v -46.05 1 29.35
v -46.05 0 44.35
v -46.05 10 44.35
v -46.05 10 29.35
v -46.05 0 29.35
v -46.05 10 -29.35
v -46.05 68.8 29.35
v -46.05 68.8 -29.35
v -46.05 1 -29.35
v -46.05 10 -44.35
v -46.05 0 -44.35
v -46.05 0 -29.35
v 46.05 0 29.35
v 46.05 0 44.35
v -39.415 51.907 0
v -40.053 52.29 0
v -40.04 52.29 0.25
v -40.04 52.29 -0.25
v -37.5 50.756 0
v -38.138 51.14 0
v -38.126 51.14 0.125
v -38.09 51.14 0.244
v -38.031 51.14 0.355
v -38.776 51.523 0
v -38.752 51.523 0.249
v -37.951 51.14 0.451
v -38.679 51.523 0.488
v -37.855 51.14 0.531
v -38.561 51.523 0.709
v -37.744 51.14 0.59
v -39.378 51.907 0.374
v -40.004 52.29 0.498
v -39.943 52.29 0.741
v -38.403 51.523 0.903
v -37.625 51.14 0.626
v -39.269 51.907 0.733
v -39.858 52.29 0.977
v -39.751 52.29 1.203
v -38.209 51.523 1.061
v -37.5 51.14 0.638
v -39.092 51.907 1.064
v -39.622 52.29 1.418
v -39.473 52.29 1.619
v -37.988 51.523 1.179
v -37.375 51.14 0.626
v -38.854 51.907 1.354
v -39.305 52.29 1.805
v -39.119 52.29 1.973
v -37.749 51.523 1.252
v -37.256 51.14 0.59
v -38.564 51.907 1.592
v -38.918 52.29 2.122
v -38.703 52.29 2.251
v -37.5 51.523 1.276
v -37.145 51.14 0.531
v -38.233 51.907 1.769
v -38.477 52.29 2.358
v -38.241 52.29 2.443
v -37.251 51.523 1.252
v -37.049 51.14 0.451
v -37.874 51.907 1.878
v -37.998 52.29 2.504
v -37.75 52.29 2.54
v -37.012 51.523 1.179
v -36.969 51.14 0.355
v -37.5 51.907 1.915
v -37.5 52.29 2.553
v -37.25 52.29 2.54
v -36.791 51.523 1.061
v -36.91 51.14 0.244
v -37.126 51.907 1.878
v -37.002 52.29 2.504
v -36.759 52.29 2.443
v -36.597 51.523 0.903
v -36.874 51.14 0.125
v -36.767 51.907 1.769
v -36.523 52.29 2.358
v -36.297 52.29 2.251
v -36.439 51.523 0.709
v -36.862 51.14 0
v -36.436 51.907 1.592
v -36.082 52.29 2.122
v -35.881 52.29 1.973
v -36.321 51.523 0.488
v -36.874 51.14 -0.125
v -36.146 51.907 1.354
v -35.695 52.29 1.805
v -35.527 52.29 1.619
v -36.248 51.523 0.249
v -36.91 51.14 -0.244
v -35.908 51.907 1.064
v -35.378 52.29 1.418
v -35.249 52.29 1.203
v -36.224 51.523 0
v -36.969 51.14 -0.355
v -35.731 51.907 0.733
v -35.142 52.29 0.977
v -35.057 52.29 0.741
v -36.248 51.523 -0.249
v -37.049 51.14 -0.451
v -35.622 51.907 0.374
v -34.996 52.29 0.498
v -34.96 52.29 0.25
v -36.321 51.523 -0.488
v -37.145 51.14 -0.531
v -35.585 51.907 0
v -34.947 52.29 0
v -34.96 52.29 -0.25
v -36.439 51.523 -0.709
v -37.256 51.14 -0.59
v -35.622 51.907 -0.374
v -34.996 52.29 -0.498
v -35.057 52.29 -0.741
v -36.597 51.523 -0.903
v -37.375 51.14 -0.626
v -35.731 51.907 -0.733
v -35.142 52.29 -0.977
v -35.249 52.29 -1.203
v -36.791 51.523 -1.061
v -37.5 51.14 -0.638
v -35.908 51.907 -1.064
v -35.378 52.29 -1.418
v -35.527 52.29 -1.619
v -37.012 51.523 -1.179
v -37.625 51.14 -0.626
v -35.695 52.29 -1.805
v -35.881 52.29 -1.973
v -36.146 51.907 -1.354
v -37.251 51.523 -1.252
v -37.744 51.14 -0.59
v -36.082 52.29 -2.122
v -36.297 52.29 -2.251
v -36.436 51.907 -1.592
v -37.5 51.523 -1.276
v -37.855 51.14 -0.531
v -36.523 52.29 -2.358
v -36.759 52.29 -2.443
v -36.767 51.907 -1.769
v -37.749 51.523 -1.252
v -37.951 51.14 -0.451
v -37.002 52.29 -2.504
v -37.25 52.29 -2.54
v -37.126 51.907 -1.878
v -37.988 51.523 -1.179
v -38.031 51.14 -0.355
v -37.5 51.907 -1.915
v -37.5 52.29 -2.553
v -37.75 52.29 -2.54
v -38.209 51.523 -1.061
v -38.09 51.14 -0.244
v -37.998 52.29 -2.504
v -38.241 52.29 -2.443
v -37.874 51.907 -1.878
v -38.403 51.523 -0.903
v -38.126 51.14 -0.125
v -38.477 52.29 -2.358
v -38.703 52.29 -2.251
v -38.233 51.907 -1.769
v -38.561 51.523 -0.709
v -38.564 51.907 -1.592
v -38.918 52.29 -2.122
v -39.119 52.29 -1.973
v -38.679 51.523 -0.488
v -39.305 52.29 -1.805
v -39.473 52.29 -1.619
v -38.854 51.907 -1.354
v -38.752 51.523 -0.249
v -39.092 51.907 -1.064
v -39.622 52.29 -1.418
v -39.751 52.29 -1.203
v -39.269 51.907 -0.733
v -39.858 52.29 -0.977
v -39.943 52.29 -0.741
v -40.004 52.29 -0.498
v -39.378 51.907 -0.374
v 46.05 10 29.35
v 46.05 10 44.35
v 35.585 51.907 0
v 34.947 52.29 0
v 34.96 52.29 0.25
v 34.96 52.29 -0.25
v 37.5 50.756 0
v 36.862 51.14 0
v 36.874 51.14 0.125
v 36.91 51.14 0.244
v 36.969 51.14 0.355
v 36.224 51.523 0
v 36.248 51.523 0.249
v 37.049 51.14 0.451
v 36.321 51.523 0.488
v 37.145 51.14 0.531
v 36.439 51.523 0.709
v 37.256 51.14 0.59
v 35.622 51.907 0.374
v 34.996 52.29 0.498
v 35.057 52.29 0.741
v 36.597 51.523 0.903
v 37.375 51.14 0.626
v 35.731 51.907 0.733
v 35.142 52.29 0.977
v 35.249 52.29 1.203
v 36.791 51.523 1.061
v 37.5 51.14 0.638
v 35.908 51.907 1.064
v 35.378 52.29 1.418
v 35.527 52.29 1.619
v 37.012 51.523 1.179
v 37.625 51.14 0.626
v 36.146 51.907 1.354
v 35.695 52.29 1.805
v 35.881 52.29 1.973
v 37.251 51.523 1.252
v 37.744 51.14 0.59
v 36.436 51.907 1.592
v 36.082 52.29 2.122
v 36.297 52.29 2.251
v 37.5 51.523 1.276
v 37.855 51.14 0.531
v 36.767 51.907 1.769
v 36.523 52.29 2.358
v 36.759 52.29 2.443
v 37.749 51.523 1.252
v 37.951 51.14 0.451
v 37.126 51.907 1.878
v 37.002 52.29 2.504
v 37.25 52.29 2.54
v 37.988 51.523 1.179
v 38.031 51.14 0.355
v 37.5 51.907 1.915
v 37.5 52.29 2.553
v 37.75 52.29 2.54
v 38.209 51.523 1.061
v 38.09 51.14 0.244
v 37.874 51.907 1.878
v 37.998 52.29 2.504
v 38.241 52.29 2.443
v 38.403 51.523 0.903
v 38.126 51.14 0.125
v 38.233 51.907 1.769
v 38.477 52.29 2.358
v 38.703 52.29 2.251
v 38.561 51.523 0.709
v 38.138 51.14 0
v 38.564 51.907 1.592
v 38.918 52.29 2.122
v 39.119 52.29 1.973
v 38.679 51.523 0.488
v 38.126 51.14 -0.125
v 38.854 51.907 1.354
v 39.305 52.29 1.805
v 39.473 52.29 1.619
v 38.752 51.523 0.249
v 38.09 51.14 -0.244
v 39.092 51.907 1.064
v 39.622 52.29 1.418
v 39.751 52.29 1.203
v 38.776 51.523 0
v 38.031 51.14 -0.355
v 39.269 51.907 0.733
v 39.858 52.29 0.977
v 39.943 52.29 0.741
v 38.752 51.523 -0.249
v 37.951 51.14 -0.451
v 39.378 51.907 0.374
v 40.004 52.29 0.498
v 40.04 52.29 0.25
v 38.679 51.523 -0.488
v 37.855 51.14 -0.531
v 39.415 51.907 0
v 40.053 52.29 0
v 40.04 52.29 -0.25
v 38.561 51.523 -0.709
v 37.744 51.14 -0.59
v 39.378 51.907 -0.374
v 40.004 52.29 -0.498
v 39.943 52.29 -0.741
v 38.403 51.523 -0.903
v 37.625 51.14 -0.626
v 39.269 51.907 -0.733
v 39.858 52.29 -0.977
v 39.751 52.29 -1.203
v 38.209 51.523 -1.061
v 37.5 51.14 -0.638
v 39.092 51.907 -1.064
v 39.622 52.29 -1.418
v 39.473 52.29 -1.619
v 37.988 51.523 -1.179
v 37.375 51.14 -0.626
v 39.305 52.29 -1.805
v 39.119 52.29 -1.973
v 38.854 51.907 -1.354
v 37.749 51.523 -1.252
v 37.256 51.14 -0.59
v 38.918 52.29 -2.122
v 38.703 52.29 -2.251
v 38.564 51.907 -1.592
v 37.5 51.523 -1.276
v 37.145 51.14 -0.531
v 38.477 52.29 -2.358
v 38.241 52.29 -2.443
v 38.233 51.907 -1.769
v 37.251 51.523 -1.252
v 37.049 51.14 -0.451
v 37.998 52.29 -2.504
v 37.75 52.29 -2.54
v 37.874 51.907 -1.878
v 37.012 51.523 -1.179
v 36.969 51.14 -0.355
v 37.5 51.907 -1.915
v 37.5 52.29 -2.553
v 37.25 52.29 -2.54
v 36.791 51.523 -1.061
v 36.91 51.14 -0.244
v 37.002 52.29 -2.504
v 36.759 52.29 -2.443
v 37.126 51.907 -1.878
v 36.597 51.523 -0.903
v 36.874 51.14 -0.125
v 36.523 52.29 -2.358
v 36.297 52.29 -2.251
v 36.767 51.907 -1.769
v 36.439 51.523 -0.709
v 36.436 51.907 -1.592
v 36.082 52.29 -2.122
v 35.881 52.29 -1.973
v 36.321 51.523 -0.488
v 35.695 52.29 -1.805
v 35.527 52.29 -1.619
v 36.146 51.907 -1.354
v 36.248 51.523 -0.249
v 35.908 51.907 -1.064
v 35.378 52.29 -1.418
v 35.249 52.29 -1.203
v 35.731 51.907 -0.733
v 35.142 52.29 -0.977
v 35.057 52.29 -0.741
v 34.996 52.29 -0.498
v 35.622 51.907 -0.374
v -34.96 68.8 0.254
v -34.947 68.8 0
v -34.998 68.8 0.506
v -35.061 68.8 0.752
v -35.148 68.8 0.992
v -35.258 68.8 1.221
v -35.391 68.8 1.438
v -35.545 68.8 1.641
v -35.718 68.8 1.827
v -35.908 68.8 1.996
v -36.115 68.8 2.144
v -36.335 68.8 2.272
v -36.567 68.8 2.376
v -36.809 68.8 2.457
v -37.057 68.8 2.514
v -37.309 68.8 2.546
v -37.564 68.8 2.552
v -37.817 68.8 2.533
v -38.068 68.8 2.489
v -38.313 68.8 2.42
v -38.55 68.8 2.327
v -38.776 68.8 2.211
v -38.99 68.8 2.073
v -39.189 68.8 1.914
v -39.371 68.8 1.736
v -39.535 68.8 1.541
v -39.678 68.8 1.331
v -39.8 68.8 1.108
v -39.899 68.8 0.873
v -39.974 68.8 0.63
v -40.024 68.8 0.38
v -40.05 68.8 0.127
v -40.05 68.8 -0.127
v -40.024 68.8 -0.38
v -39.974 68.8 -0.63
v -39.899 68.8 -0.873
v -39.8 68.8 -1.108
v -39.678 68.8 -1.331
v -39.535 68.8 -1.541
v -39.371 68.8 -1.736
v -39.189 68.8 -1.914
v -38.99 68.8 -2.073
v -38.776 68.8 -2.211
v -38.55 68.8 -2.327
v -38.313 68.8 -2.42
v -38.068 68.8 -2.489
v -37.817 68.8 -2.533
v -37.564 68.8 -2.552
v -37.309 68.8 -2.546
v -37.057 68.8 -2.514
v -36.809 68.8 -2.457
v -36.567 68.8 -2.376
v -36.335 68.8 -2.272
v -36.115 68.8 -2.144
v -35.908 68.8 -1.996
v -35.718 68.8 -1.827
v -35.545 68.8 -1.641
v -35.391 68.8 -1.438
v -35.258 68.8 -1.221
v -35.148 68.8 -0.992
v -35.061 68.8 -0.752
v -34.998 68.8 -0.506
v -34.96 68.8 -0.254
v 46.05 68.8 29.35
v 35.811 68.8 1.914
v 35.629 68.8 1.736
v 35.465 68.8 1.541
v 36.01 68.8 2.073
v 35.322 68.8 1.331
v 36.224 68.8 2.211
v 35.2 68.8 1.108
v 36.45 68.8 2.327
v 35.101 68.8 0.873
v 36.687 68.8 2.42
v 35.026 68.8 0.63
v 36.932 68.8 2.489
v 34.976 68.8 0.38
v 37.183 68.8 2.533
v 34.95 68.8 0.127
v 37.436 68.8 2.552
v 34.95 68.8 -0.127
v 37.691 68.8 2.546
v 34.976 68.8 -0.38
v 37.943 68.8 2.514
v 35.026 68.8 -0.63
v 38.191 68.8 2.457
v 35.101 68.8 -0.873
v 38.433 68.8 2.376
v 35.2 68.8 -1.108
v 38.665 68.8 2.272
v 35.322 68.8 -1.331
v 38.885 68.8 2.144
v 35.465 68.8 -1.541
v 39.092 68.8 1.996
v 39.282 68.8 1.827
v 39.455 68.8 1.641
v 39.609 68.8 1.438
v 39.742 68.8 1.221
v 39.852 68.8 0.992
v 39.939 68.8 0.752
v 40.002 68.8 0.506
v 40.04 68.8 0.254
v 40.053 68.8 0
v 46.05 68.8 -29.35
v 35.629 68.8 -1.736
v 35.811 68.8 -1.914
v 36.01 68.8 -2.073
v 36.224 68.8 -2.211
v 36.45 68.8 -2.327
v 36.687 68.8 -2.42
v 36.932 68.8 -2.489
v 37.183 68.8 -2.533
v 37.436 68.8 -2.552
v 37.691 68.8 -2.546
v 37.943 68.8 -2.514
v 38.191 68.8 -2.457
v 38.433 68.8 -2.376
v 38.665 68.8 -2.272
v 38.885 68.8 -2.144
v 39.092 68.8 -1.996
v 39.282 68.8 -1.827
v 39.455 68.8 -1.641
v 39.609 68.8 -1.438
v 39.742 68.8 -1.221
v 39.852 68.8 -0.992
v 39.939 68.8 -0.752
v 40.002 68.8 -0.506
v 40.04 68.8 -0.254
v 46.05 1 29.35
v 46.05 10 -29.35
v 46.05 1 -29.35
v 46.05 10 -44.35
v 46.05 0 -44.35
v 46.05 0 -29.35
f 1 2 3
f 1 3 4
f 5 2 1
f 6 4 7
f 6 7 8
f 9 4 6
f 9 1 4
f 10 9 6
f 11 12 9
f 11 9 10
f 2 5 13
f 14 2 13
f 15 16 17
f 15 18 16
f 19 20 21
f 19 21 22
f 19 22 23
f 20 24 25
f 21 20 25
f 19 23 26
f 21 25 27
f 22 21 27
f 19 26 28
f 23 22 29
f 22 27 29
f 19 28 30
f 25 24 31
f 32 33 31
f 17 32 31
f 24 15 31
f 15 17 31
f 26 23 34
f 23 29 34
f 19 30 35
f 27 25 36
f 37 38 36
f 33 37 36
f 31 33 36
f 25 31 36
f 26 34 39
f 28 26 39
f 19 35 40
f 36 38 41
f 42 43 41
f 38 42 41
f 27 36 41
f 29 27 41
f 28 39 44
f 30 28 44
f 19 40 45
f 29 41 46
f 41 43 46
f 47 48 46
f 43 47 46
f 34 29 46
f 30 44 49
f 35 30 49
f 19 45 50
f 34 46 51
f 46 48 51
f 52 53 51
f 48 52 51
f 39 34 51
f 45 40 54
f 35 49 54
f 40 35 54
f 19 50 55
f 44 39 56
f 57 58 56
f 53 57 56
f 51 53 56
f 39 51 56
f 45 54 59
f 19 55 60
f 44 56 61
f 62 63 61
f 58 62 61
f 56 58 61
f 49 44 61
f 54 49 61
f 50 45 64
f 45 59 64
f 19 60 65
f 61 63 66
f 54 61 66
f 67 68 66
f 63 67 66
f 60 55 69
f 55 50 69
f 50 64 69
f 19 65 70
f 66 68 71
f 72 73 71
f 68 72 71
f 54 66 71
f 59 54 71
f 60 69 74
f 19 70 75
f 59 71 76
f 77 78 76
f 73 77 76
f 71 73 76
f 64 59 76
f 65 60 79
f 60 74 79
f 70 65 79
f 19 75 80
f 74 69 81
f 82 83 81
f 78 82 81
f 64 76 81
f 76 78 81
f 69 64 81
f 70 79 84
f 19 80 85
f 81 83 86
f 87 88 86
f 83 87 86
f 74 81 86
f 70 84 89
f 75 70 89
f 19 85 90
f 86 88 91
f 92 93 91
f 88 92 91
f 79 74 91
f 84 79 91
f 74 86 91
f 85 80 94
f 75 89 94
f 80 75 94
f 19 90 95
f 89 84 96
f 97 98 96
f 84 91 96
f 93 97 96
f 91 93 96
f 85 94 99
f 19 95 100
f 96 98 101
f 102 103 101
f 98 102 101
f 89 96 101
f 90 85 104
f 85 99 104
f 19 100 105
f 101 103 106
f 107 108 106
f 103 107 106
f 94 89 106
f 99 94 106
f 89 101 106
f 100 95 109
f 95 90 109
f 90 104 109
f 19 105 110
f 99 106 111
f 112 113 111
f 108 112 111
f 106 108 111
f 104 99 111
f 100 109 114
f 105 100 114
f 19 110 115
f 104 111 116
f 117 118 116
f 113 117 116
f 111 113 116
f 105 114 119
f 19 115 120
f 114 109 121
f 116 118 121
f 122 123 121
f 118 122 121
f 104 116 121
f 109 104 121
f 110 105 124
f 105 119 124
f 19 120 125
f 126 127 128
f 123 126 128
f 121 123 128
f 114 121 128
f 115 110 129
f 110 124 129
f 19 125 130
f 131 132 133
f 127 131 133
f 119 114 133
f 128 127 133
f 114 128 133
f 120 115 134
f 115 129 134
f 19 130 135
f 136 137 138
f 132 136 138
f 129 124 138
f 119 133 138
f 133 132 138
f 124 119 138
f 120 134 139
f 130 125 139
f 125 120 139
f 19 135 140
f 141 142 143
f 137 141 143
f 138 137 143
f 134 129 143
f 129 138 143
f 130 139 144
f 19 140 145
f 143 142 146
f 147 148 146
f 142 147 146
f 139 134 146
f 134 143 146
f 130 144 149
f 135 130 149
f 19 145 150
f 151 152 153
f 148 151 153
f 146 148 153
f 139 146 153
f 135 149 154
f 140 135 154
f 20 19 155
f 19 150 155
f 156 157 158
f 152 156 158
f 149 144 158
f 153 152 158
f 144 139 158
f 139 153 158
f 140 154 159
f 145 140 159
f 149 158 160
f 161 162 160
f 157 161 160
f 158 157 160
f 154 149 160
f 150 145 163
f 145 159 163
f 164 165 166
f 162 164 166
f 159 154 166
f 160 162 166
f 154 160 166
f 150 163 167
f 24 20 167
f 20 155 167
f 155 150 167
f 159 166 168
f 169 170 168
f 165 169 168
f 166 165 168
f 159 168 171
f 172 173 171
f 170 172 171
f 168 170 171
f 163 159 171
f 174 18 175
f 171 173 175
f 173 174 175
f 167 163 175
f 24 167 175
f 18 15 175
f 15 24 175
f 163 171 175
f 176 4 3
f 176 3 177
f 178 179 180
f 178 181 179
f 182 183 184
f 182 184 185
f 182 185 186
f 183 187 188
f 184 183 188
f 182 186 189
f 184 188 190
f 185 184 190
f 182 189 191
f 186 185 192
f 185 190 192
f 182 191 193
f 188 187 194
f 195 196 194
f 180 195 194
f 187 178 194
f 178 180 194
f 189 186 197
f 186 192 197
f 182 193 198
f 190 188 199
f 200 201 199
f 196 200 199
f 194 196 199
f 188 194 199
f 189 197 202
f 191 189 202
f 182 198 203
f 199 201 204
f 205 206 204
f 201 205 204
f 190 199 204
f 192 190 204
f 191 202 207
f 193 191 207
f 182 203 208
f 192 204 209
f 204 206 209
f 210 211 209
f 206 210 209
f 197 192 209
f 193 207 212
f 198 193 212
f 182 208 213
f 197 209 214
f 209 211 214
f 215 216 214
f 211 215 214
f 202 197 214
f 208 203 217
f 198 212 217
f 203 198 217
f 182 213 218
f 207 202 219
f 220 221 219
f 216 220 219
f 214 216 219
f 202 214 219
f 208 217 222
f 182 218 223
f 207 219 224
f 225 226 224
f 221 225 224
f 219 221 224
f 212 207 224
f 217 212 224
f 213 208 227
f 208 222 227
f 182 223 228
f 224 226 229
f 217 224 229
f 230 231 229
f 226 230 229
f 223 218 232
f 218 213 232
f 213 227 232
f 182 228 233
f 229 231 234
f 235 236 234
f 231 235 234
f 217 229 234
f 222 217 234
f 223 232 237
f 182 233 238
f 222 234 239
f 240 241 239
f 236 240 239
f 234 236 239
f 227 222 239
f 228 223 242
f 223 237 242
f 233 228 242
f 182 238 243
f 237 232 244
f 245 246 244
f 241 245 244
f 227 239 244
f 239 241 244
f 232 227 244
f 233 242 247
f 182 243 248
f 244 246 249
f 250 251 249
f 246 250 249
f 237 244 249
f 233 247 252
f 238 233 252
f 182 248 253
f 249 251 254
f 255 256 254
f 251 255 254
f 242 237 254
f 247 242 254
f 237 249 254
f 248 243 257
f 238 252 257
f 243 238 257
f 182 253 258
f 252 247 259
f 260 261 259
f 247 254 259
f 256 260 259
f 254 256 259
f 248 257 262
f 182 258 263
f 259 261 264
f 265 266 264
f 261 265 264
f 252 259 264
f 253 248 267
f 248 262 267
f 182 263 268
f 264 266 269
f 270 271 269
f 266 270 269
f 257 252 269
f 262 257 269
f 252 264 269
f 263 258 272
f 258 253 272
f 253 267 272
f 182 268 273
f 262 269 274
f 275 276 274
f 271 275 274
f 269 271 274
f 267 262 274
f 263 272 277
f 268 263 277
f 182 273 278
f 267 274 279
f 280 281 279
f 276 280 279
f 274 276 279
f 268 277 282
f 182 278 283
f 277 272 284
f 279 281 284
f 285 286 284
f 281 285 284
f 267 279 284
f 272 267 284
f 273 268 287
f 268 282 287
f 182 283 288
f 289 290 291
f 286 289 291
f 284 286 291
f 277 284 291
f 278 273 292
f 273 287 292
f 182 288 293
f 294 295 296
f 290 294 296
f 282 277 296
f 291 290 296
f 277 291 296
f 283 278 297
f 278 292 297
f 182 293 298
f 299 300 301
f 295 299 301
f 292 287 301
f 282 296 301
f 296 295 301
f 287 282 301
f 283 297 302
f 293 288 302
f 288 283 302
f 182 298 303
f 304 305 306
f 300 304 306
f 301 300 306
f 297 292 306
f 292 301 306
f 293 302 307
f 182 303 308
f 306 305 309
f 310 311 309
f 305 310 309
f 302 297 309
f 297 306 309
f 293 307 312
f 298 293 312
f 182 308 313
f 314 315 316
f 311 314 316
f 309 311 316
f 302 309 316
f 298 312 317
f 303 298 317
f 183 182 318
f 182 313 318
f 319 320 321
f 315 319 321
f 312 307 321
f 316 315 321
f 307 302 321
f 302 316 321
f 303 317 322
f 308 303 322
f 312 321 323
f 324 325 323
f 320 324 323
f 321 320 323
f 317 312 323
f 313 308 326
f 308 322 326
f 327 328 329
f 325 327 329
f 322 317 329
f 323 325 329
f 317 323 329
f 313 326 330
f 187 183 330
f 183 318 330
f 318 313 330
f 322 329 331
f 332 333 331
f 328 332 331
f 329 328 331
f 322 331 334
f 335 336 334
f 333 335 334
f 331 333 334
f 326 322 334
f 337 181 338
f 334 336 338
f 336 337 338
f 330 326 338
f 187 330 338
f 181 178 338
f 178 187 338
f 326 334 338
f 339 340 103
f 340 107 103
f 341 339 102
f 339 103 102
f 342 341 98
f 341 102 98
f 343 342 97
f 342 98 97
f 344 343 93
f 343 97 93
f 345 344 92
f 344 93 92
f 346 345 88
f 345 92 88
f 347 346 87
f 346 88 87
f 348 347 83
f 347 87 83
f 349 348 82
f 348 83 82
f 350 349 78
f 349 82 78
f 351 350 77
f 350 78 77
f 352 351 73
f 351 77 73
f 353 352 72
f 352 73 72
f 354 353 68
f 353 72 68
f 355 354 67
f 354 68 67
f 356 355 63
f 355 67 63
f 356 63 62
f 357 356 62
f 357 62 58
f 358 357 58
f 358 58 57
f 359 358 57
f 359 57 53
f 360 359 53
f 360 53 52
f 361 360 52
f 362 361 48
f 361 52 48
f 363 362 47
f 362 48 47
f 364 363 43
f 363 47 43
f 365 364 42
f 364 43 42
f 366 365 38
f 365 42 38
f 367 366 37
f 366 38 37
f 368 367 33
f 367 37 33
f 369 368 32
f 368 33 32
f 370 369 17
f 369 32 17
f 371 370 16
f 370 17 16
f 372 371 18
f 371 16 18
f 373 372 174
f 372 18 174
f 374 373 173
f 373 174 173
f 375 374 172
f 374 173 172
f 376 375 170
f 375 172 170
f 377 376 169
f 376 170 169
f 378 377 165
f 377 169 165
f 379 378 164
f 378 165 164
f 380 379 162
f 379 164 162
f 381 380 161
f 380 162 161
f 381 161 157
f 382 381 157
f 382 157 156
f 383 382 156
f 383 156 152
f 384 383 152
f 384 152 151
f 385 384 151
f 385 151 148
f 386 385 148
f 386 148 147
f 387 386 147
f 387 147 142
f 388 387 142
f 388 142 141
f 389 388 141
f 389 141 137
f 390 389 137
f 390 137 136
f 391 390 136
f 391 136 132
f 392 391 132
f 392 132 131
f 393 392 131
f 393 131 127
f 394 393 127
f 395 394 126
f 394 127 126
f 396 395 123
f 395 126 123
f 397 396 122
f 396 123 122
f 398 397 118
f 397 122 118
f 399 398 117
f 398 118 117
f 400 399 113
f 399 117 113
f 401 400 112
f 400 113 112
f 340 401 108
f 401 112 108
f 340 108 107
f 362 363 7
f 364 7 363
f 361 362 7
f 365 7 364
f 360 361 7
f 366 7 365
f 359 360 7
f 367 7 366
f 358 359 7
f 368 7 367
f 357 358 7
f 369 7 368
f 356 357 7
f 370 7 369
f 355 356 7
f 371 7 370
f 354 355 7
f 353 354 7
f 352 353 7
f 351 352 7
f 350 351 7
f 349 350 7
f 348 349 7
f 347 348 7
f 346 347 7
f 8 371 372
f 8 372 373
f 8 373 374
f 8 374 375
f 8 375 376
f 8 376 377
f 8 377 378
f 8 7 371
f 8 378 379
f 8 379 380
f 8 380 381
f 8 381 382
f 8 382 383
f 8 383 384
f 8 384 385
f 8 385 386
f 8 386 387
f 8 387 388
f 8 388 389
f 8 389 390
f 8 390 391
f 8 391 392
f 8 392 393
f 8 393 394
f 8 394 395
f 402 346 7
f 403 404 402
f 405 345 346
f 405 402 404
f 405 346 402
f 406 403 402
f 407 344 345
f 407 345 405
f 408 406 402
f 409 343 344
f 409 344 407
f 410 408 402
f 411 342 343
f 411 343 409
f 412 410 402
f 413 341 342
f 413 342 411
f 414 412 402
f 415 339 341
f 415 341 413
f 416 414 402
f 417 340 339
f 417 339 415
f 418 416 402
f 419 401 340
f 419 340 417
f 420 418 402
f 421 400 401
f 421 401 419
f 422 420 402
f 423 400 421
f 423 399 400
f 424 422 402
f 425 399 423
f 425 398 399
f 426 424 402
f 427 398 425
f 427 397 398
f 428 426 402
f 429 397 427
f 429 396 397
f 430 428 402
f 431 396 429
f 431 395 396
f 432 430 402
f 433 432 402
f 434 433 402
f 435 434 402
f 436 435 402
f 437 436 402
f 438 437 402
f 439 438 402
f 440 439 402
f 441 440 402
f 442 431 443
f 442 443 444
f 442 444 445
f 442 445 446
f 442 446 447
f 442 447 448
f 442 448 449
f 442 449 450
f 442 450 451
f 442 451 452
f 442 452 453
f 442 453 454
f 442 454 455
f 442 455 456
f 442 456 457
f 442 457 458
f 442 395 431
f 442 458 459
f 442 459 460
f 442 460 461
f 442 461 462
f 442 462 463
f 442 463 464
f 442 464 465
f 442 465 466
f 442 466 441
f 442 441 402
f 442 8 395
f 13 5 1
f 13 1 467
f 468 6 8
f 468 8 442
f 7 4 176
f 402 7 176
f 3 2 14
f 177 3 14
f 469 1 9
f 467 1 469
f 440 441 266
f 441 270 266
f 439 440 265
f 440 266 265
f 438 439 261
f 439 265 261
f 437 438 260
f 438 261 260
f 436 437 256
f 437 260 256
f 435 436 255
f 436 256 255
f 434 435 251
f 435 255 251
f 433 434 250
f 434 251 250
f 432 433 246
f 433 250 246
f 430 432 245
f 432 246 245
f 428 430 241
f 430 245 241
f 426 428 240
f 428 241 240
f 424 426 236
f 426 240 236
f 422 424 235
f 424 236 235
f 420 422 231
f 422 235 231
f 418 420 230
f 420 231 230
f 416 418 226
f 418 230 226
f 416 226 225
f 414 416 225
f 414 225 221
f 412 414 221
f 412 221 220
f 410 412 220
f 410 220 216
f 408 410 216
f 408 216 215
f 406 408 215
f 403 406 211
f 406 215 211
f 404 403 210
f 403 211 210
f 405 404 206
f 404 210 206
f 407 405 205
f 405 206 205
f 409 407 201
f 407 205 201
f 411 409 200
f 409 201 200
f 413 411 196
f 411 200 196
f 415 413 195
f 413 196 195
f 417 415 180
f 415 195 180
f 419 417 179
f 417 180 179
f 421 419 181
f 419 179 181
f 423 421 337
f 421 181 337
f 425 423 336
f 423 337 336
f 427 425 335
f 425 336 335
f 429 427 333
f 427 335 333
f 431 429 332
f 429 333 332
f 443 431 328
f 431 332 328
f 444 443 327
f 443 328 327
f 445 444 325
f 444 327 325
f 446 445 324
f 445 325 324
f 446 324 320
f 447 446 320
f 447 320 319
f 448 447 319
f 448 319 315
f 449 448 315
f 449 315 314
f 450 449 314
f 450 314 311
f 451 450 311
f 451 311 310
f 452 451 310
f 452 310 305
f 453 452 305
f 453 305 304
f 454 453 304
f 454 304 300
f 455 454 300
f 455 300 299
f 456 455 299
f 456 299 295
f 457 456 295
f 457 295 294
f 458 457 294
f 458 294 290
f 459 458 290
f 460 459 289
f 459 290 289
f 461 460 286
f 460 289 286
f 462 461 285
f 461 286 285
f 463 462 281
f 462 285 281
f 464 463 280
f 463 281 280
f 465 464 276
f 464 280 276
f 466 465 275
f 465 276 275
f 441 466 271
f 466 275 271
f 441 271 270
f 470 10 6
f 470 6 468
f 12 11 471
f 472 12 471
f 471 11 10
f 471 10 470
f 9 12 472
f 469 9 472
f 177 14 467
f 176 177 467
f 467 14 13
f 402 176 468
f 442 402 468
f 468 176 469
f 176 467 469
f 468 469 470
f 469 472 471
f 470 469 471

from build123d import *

# Parameters (mm, degrees)
SKETCH1_W                   = 92.1
SKETCH1_H                   = 88.7
BOSS_EXTRUDE1_DEPTH         = 10
SKETCH2_W                   = 92.1
SKETCH2_H                   = 58.7
BOSS_EXTRUDE2_DEPTH         = 58.8
SKETCH16_W                  = 92.1
SKETCH16_H                  = 58.7
CUT_EXTRUDE2_DEPTH          = 1
F_1_4_20_TAPPED_HOLE1_D     = 5.1054
F_1_4_20_TAPPED_HOLE1_DEPTH = 16.51
F_1_4_20_TAPPED_HOLE1_TIP   = 1.533816902


with BuildPart() as part:
    # Sketch1 → Boss-Extrude1 (new body)
    with BuildSketch(Plane(origin=(0, 0, 0), x_dir=(1, 0, 0), z_dir=(0, 1, 0))):
        Rectangle(SKETCH1_W, SKETCH1_H)
    extrude(amount=BOSS_EXTRUDE1_DEPTH)

    # Sketch2 → Boss-Extrude2 (add)
    with BuildSketch(Plane(origin=(0, 10, 0), x_dir=(1, 0, 0), z_dir=(0, 1, 0))):
        Rectangle(SKETCH2_W, SKETCH2_H)
    extrude(amount=BOSS_EXTRUDE2_DEPTH)

    # Sketch16 → Cut-Extrude2 (cut)
    with BuildSketch(Plane.XZ):
        Rectangle(SKETCH16_W, SKETCH16_H)
    extrude(amount=-CUT_EXTRUDE2_DEPTH, mode=Mode.SUBTRACT)

    # 1/4-20 Tapped Hole1
    with Locations(Plane(origin=(0, 68.8, 0), x_dir=(-1, 0, 0), z_dir=(0, 1, 0))):
        with Locations((37.5, 0), (-37.5, 0)):
            Hole(F_1_4_20_TAPPED_HOLE1_D / 2, depth=F_1_4_20_TAPPED_HOLE1_DEPTH)
            with Locations((0, 0, -(F_1_4_20_TAPPED_HOLE1_DEPTH + F_1_4_20_TAPPED_HOLE1_TIP / 2))):  # 118° drill point
                Cone(0, F_1_4_20_TAPPED_HOLE1_D / 2, F_1_4_20_TAPPED_HOLE1_TIP, mode=Mode.SUBTRACT)


solid = part.part
